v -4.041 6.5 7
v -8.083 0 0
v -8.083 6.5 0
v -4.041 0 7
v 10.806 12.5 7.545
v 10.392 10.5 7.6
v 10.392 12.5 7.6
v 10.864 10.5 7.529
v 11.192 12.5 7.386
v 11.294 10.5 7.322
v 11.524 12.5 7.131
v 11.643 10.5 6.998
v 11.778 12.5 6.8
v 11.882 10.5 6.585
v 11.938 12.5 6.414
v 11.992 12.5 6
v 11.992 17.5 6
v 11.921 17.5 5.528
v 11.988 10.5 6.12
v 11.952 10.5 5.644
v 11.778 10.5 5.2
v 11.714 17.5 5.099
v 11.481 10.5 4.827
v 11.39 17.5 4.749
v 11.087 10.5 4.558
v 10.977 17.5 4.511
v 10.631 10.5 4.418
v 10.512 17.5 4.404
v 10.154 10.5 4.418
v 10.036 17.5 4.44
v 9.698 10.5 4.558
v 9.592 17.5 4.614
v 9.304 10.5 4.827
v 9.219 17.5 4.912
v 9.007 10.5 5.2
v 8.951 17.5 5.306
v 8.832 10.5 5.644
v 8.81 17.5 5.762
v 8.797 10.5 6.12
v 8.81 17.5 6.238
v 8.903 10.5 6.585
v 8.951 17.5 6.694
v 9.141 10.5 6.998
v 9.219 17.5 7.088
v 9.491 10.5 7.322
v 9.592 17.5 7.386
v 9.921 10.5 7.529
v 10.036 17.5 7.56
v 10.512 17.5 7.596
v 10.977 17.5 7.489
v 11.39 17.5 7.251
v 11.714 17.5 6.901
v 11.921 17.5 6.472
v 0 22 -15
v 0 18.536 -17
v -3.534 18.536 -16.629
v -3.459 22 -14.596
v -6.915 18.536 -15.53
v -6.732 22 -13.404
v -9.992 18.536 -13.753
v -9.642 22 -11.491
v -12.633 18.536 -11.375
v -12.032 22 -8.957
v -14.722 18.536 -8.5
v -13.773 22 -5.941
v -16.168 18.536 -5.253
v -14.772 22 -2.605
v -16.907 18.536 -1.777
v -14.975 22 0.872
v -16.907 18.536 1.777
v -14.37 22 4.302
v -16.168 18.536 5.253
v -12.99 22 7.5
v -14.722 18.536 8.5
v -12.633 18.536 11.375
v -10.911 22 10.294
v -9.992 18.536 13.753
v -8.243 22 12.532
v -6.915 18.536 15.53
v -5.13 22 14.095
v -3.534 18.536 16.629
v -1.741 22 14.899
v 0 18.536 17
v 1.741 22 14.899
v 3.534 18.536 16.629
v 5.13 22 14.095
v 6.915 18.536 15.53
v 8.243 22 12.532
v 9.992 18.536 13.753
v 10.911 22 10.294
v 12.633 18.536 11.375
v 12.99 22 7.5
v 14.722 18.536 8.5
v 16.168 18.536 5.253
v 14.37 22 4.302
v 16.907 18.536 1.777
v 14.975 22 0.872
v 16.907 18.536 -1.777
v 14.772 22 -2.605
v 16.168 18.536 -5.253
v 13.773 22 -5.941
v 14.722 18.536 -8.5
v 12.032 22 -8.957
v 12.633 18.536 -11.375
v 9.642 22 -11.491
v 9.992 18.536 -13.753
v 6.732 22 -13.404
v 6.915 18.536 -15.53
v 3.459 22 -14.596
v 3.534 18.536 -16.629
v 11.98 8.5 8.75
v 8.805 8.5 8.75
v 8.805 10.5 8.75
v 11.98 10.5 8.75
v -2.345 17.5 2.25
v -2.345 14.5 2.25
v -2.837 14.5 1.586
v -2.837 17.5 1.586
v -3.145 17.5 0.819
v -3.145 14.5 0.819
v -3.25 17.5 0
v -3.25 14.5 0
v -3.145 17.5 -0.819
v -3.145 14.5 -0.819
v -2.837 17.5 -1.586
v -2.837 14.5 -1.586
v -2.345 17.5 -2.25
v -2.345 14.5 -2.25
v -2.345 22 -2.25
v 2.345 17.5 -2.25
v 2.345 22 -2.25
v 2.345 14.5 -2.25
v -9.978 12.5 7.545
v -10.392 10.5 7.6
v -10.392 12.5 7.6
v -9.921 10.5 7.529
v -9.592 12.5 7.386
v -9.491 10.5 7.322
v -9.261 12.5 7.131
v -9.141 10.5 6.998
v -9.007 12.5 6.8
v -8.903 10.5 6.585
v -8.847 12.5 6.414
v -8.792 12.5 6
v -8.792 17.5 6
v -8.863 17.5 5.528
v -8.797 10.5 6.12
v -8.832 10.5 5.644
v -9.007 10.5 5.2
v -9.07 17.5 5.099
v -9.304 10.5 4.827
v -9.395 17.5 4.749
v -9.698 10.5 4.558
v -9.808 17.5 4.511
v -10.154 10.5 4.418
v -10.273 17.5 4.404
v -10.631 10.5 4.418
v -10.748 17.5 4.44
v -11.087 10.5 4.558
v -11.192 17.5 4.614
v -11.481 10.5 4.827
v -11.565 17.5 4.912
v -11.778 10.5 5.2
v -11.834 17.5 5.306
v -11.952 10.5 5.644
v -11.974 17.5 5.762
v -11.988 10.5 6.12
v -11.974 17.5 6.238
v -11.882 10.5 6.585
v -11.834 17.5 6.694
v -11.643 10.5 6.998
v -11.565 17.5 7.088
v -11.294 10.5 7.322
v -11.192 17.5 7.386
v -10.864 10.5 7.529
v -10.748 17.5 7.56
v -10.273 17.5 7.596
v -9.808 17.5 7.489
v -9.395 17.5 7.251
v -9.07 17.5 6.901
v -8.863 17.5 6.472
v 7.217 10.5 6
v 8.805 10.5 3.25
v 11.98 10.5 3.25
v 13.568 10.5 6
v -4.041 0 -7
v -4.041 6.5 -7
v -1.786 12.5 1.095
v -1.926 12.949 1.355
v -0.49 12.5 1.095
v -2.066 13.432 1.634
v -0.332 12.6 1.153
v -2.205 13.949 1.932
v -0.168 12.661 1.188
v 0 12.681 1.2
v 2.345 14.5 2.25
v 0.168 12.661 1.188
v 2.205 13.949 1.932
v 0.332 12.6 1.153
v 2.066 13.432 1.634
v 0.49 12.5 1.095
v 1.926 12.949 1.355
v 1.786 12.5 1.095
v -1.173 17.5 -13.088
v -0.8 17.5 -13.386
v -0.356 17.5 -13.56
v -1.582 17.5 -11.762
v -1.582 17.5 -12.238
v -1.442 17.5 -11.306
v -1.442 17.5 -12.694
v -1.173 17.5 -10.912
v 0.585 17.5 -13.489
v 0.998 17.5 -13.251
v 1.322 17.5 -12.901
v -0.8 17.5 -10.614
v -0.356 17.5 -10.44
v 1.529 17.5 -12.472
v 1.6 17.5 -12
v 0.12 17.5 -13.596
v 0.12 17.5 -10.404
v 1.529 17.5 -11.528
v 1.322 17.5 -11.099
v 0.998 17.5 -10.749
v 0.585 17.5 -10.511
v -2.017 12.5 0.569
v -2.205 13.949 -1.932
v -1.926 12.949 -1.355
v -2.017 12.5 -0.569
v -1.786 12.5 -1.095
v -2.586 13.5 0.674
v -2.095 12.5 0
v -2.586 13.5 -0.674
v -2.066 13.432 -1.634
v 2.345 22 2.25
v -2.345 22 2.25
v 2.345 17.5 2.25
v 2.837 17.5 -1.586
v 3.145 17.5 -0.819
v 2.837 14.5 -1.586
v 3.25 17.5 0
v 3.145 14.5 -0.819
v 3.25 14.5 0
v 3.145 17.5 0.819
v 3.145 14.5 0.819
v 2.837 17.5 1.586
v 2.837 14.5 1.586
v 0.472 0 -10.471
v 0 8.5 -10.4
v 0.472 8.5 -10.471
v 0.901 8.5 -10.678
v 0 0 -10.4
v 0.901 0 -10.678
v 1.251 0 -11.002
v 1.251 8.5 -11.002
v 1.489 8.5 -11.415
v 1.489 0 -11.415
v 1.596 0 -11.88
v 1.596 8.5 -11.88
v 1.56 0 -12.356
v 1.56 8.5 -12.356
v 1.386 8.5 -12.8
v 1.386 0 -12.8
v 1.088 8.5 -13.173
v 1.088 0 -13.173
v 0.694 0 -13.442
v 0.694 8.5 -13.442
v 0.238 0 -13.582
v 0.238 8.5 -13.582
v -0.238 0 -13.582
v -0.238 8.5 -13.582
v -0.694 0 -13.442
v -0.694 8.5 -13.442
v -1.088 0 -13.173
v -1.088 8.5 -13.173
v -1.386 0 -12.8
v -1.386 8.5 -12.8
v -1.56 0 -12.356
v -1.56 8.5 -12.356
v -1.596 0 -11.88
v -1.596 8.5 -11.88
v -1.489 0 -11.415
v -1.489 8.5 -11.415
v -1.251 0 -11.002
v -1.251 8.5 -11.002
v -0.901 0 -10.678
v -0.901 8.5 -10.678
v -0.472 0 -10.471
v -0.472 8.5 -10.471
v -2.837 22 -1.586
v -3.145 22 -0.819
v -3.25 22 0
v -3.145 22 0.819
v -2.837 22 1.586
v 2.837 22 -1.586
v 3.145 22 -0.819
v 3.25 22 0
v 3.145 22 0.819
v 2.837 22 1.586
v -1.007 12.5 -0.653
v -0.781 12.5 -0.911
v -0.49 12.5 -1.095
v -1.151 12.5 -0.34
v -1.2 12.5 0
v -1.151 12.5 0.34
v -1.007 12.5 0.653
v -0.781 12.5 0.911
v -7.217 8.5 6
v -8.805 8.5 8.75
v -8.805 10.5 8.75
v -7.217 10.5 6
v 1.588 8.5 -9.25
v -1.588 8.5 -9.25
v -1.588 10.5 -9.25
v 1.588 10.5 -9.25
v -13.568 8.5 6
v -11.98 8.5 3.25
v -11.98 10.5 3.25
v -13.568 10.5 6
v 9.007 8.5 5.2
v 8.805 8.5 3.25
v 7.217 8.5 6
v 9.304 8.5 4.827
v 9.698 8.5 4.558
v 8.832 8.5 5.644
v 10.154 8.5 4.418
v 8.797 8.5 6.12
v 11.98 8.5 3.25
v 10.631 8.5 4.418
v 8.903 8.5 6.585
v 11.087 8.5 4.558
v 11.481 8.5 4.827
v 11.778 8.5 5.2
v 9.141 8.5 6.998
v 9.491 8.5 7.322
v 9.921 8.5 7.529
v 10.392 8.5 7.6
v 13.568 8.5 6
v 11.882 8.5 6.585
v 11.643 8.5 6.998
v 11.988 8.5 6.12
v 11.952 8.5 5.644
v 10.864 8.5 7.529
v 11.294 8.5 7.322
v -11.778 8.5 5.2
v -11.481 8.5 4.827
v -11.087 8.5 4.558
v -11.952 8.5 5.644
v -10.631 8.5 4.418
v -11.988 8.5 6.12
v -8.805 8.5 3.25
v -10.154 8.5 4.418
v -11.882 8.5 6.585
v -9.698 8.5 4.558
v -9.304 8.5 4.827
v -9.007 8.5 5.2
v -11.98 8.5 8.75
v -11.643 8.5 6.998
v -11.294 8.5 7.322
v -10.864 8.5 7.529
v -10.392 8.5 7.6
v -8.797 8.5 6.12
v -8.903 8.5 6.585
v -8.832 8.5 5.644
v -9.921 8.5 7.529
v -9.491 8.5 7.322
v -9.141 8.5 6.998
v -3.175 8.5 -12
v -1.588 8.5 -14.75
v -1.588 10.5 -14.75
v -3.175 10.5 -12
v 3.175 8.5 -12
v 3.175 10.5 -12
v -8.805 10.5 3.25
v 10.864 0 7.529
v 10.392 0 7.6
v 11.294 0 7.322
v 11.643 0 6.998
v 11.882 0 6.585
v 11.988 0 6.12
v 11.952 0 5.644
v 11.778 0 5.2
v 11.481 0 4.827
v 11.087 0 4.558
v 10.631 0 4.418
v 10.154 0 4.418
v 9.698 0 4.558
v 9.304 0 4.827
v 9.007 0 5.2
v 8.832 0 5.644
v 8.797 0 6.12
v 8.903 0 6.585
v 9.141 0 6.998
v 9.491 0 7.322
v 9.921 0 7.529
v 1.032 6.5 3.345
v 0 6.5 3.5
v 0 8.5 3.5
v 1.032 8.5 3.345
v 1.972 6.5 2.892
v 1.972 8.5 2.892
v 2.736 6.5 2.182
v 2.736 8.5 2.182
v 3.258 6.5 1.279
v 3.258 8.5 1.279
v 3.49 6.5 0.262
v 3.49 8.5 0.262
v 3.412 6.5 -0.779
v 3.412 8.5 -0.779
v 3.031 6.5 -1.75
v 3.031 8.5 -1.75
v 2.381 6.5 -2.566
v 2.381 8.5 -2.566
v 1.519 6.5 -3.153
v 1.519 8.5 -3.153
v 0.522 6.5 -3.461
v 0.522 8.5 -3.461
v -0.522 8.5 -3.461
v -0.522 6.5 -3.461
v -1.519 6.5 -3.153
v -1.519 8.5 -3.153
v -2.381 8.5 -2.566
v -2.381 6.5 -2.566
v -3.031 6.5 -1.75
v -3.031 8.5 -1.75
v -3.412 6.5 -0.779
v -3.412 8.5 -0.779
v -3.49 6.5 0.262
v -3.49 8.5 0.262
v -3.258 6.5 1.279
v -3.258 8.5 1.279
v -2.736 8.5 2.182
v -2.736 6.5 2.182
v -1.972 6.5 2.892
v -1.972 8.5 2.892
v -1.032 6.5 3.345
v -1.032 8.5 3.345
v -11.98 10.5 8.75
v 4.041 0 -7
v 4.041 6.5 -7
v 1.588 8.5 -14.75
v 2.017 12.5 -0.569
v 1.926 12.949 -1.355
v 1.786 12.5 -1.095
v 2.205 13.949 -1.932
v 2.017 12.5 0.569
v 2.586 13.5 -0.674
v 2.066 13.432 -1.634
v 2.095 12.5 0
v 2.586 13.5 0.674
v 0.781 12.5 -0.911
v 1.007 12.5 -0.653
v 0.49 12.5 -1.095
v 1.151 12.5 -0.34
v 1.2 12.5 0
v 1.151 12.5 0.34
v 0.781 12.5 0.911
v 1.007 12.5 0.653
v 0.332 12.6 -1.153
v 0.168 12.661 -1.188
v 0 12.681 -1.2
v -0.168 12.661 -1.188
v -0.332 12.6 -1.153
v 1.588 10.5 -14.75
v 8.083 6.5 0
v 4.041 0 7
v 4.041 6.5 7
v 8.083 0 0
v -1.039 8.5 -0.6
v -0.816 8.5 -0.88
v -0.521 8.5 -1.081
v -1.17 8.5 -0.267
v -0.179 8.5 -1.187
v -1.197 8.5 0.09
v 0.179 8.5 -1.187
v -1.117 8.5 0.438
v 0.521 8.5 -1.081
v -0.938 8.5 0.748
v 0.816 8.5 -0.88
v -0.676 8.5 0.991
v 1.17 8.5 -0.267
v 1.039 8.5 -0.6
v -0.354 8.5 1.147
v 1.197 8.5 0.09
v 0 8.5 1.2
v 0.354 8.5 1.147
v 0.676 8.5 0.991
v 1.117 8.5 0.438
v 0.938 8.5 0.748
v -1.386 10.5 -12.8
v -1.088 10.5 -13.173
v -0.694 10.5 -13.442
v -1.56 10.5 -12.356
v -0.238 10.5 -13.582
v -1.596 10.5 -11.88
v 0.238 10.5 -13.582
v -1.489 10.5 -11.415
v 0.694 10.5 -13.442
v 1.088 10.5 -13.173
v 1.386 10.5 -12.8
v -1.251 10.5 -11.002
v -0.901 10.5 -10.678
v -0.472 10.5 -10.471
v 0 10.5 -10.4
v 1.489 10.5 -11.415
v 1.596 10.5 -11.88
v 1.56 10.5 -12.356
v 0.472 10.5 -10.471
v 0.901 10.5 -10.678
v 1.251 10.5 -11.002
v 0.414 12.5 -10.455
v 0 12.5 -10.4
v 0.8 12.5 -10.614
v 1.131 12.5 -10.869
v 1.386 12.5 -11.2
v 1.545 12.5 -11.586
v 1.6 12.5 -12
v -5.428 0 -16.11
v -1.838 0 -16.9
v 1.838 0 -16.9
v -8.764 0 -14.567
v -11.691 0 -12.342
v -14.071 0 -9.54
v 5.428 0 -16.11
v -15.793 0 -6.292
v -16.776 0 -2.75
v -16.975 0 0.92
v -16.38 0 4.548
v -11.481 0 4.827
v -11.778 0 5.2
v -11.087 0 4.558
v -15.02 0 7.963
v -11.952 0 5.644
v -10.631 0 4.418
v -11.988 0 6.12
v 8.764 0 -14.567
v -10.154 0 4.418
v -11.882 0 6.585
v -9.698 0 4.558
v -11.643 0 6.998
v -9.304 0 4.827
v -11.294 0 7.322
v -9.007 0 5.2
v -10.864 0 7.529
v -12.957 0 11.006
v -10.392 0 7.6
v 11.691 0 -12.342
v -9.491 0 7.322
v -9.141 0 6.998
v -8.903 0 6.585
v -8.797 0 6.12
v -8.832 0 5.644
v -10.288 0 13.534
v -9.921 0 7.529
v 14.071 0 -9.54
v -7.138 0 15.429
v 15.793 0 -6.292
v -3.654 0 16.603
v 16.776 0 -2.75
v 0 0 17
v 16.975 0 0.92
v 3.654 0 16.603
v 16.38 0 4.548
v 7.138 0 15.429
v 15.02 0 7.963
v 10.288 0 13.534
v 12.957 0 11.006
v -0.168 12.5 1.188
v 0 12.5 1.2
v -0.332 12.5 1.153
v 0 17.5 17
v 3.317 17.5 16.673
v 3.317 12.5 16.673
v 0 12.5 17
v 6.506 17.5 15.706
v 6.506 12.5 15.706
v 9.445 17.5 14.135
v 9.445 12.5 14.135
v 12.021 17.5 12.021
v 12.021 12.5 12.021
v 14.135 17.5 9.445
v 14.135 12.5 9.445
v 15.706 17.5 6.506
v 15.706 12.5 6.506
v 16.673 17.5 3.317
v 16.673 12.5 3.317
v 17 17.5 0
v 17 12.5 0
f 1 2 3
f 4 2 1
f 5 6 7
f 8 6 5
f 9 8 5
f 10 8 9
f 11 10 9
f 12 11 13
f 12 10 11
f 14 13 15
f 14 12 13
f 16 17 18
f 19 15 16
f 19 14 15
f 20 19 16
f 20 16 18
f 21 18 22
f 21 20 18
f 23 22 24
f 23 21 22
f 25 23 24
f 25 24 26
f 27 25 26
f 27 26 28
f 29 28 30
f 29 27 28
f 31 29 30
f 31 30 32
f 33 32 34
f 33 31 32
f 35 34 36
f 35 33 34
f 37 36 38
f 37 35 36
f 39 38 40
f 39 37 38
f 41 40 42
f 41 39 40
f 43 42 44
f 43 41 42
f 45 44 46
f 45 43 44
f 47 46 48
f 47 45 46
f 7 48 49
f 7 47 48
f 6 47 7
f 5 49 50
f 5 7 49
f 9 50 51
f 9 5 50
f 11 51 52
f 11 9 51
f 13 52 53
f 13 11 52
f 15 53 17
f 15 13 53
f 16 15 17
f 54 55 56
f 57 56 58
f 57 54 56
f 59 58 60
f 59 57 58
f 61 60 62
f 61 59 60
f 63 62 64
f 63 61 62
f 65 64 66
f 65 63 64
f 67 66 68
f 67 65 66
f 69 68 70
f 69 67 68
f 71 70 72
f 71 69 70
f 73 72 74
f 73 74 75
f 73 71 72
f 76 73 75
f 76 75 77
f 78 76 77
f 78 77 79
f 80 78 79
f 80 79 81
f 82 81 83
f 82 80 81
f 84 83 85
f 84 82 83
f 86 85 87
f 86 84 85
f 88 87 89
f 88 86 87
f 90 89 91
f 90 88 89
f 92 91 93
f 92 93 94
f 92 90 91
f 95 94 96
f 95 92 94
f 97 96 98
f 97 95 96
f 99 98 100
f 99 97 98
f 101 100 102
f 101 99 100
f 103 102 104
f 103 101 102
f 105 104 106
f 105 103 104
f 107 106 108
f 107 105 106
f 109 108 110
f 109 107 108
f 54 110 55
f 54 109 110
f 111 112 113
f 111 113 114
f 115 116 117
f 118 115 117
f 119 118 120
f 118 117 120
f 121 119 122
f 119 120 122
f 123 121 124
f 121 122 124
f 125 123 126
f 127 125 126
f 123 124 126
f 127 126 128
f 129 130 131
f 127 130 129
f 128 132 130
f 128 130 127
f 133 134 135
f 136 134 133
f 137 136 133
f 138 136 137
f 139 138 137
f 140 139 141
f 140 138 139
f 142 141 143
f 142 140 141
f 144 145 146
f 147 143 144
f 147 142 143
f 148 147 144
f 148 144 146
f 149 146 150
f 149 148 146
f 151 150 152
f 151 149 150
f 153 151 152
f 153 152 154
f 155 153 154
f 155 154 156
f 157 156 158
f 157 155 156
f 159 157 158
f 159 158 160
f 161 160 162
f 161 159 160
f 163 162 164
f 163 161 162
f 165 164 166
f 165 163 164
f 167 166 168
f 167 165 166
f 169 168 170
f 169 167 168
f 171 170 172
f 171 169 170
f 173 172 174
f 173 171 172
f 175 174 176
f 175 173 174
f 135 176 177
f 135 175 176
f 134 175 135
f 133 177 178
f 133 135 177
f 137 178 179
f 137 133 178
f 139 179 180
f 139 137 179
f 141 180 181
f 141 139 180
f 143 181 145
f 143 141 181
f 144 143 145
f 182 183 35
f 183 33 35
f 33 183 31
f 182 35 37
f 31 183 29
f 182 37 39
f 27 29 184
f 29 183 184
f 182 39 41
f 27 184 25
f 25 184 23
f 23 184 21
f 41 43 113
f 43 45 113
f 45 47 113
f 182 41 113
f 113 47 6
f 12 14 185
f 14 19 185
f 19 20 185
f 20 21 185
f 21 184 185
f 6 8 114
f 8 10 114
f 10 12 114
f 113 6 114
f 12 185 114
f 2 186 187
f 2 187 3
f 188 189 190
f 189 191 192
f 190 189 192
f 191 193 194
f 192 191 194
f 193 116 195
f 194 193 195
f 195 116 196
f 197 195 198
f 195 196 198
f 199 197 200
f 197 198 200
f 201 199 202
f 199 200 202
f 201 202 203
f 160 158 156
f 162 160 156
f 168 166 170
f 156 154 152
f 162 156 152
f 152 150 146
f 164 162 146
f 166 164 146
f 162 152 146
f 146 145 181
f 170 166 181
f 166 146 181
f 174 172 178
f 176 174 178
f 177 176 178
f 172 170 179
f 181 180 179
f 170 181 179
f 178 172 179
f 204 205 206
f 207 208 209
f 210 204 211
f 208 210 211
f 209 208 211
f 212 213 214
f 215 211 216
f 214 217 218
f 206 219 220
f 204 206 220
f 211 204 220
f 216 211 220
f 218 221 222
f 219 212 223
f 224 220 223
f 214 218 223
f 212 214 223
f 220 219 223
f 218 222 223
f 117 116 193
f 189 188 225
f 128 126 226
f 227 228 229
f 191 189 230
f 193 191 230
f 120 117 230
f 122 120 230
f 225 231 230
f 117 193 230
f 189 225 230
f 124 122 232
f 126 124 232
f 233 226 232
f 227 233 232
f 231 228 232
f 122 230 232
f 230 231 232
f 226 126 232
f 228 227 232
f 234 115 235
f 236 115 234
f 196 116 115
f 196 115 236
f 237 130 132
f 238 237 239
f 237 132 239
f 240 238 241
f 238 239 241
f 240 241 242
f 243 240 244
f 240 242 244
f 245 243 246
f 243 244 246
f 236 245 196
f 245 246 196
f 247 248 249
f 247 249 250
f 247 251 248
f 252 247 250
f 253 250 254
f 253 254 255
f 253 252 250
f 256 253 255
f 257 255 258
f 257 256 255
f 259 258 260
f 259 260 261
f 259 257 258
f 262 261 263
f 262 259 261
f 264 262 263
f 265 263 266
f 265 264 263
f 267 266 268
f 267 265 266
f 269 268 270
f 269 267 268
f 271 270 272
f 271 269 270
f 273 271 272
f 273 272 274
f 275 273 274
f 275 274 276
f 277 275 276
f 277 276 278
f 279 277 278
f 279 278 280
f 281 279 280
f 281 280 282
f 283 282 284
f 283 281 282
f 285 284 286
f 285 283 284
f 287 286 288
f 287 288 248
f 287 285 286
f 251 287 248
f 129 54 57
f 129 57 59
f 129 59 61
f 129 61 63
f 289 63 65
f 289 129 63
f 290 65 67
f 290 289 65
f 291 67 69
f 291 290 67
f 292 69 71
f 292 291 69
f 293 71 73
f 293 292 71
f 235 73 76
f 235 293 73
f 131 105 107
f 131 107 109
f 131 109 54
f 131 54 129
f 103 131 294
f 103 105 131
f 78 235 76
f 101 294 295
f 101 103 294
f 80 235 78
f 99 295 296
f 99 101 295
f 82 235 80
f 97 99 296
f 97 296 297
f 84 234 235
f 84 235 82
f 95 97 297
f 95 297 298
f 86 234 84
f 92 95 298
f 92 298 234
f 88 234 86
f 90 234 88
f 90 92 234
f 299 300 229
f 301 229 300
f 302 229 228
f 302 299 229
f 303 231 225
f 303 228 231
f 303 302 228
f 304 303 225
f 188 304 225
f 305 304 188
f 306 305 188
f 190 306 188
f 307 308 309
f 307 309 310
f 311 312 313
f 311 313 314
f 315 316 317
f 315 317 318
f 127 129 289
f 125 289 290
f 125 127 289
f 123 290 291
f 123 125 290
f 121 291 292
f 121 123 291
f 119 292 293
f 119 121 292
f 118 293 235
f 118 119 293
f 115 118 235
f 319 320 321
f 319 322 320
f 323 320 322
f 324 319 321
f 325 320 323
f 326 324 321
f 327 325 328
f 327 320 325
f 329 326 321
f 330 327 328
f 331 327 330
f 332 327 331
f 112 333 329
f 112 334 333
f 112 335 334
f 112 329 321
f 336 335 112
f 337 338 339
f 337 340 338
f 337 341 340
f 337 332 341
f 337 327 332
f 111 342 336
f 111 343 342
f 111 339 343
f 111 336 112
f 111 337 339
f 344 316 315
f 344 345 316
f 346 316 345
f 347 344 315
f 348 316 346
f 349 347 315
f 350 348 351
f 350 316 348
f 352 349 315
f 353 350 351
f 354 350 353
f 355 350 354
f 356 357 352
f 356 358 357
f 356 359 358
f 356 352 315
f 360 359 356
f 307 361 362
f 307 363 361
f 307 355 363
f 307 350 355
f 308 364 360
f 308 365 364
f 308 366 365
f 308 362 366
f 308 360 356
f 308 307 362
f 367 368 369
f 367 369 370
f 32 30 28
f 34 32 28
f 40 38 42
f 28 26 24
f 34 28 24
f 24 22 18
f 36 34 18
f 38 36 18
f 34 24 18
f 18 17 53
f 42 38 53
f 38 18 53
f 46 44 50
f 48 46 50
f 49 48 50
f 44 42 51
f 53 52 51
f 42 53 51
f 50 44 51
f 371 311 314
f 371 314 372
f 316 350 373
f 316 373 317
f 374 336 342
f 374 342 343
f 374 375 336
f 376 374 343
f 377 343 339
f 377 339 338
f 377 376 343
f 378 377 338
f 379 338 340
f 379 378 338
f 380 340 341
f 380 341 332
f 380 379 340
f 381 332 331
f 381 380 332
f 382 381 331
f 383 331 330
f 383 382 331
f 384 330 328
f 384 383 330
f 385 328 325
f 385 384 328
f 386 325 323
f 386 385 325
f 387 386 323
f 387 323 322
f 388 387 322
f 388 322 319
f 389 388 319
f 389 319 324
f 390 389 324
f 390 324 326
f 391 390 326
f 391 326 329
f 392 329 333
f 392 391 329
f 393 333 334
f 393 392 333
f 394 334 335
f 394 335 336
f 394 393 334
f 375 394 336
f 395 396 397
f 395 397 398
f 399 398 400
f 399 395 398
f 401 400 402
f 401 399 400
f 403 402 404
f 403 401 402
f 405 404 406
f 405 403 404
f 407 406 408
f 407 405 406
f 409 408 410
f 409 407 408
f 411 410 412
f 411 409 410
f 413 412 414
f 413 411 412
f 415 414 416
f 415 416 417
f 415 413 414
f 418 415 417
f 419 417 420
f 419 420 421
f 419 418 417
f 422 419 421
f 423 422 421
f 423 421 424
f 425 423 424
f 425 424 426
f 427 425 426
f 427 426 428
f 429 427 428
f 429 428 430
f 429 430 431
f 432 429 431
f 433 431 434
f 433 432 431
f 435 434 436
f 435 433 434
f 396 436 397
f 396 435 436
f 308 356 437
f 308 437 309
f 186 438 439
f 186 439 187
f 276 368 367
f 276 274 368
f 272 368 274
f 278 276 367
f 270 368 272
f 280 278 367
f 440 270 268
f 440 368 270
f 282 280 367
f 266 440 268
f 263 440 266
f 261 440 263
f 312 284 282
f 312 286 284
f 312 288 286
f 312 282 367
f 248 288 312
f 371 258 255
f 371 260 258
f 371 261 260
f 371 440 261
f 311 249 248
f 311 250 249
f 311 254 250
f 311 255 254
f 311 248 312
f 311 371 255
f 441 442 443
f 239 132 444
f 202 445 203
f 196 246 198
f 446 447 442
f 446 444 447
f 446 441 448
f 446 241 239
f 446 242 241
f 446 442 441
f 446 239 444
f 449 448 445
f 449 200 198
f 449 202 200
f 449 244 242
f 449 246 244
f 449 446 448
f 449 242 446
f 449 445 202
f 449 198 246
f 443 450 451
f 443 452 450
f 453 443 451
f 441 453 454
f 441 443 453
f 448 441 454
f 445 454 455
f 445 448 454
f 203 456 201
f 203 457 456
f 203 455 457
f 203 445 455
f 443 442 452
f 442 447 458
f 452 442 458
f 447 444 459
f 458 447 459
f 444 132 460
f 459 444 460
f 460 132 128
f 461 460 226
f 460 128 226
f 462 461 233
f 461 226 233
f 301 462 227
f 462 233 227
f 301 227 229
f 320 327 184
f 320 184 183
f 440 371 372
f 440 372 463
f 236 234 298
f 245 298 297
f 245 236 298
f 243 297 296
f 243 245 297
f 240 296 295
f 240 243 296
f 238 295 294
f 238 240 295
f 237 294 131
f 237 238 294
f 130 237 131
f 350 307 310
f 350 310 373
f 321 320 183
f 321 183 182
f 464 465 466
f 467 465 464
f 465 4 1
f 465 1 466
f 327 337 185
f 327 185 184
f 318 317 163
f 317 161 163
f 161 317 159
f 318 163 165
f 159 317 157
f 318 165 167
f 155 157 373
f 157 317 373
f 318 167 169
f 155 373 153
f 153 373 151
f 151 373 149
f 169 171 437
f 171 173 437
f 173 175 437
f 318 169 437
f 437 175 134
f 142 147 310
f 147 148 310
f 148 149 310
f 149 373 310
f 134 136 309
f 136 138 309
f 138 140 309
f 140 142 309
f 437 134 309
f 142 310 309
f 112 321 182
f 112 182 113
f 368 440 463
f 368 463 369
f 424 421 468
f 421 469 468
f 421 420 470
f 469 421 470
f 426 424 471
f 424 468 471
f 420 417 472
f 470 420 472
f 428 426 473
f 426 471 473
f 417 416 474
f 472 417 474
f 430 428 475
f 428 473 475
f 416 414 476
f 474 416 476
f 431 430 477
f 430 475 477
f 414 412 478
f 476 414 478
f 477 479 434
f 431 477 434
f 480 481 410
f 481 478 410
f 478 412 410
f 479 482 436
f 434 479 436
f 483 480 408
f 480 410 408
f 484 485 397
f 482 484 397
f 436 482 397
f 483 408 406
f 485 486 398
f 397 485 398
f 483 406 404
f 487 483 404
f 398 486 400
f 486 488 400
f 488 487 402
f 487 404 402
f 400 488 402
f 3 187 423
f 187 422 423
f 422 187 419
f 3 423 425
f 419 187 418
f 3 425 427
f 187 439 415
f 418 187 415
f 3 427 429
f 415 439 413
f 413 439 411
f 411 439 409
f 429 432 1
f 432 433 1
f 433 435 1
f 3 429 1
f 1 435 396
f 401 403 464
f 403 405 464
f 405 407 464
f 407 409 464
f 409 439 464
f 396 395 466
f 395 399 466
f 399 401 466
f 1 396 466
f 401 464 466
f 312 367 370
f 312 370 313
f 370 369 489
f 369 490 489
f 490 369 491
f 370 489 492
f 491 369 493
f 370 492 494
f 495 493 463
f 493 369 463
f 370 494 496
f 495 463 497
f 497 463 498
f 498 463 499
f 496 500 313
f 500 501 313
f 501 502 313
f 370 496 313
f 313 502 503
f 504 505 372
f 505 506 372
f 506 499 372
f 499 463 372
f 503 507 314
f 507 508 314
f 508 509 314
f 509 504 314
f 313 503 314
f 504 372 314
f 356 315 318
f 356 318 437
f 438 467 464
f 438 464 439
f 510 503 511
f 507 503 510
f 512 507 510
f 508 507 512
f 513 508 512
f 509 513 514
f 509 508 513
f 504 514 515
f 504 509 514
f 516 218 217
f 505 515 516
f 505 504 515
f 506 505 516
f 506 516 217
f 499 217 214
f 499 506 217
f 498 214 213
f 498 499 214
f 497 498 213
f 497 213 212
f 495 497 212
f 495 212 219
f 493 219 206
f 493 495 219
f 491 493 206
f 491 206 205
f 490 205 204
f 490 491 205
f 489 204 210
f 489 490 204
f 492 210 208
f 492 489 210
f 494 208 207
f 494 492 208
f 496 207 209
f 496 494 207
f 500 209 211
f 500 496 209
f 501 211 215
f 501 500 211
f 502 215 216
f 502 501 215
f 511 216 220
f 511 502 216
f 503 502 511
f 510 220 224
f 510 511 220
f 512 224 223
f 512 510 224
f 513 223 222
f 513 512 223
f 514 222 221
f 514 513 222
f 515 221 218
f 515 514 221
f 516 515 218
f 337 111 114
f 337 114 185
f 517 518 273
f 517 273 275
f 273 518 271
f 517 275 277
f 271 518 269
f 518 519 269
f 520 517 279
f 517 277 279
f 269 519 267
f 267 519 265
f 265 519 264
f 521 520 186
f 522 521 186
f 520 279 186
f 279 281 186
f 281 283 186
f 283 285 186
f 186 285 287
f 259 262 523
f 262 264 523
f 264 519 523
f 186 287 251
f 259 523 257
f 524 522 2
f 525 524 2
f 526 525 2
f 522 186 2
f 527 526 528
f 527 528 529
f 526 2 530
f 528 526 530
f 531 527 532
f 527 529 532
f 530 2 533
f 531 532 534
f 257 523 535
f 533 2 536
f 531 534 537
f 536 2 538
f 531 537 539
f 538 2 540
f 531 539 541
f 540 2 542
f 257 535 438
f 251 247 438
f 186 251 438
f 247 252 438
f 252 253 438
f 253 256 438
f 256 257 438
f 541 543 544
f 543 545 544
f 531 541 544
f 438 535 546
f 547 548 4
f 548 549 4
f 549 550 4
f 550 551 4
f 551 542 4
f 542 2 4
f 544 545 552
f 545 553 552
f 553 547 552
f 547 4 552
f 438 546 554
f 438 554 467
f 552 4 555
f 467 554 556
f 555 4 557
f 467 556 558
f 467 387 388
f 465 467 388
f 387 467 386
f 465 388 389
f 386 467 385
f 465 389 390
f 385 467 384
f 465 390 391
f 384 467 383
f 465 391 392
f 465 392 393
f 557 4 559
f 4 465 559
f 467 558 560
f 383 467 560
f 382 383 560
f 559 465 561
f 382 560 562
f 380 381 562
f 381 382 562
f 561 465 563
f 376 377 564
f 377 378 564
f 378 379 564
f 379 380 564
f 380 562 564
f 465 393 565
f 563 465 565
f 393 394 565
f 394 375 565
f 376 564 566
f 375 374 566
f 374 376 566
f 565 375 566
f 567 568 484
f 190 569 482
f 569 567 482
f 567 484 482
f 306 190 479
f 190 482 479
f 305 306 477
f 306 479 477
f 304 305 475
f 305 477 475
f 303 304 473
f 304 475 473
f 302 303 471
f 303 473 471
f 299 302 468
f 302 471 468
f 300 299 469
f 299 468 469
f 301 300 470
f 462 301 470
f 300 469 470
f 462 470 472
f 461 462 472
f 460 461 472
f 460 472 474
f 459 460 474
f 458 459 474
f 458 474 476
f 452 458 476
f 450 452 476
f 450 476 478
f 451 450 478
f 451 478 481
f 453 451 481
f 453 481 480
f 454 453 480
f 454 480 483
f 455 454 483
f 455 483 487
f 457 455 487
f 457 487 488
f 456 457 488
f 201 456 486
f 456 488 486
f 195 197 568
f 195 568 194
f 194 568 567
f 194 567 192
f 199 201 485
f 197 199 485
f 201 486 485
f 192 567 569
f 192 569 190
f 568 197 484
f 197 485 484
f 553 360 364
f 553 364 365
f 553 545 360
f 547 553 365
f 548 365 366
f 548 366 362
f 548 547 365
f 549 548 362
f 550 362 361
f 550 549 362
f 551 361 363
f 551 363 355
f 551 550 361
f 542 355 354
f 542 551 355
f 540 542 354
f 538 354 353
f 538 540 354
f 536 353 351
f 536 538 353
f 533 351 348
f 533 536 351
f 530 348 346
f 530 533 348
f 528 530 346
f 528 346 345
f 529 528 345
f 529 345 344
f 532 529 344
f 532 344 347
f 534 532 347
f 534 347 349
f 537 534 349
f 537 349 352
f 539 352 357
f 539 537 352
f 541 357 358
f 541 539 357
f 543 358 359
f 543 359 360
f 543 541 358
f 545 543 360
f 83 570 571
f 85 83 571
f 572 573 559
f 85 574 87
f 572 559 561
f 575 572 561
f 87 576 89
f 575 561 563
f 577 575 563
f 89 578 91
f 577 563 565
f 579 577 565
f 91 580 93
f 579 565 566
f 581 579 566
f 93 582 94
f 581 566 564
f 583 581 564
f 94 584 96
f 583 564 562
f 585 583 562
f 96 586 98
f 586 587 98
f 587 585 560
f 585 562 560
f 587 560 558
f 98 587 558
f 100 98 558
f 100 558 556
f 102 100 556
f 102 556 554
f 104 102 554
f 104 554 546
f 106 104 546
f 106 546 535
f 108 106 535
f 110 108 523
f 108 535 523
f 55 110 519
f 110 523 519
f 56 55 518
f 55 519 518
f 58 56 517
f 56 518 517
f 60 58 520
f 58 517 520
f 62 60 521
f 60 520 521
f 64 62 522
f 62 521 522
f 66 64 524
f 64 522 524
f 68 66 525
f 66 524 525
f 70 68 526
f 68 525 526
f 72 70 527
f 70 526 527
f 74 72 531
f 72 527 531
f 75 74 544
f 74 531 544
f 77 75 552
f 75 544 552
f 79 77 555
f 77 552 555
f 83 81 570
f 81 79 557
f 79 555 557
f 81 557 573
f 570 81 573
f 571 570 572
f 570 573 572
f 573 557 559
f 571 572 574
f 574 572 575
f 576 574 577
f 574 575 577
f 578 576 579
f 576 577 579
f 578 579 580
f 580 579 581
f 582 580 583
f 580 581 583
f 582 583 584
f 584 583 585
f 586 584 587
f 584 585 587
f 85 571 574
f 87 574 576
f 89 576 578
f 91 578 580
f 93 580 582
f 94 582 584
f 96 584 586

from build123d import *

# Parameters (mm, degrees)
SKETCH1_R                 = 17
SKETCH1_R_2               = 1.6000000000000005
SKETCH1_R_3               = 1.6000000000000019
SKETCH1_R_4               = 1.5999999999999999
BOSS_EXTRUDE1_DEPTH       = 6.500000000000001
SKETCH2_R                 = 17
SKETCH2_R_2               = 3.4999999999999996
SKETCH2_R_3               = 1.6000000000000012
SKETCH2_R_4               = 1.6000000000000019
SKETCH2_R_5               = 1.5999999999999963
BOSS_EXTRUDE2_DEPTH       = 2
SKETCH3_R                 = 17
SKETCH3_R_2               = 1.2
BOSS_EXTRUDE3_DEPTH       = 2
SKETCH9_R                 = 17
SKETCH9_R_2               = 1.2
SKETCH9_R_3               = 1.5999999999999963
SKETCH9_R_4               = 1.6000000000000012
SKETCH9_R_5               = 1.6000000000000019
BOSS_EXTRUDE6_DEPTH       = 2
BOSS_EXTRUDE4_OUTLINE_R   = 17
BOSS_EXTRUDE4_OUTLINE_R_2 = 1.6
BOSS_EXTRUDE4_DEPTH       = 5
SKETCH10_R                = 17
BOSS_EXTRUDE7_DEPTH       = 4.500000000000001
CHAMFER1_SIZE             = 1.154700538
CHAMFER1_SIZE_2           = 2


# Read off the part's stored shape, not the designer's step: Boss-Extrude4
with BuildPart() as part:
    # Sketch1 → Boss-Extrude1 (new body)
    with BuildSketch(Plane(origin=(0, 0, 0), x_dir=(1, 0, 0), z_dir=(0, 1, 0))):
        with Locations(Location((0, 0, 0), (0, 0, 270))):
            Circle(SKETCH1_R)
        with Locations(Location((0, 12, 0), (0, 0, 270))):
            Circle(SKETCH1_R_2, mode=Mode.SUBTRACT)
        with Locations(Location((10.392304845413268, -5.999999999999997, 0), (0, 0, 270))):
            Circle(SKETCH1_R_3, mode=Mode.SUBTRACT)
        with Locations(Location((-10.39230484541326, -6.000000000000005, 0), (0, 0, 270))):
            Circle(SKETCH1_R_4, mode=Mode.SUBTRACT)
        Polygon((4.04145188432738, -6.999999999999999), (8.082903768654761, -8.7e-16), (4.041451884327381, 6.999999999999999), (-4.041451884327381, 6.999999999999999), (-8.082903768654761, -8.7e-16), (-4.04145188432738, -6.999999999999999), align=None, mode=Mode.SUBTRACT)
    extrude(amount=BOSS_EXTRUDE1_DEPTH)

    # Sketch2 → Boss-Extrude2 (add)
    with BuildSketch(Plane(origin=(0, 6.500000000000001, 0), x_dir=(1, 0, 0), z_dir=(0, 1, 0))):
        with Locations(Location((0, 0, 0), (0, 0, 270))):
            Circle(SKETCH2_R)
        with Locations(Location((0, 0, 0), (0, 0, 270))):
            Circle(SKETCH2_R_2, mode=Mode.SUBTRACT)
        with Locations(Location((0, 12, 0), (0, 0, 270))):
            Circle(SKETCH2_R_3, mode=Mode.SUBTRACT)
        with Locations(Location((10.392304845413268, -5.999999999999997, 0), (0, 0, 270))):
            Circle(SKETCH2_R_4, mode=Mode.SUBTRACT)
        with Locations(Location((-10.39230484541326, -6.000000000000005, 0), (0, 0, 270))):
            Circle(SKETCH2_R_5, mode=Mode.SUBTRACT)
    extrude(amount=BOSS_EXTRUDE2_DEPTH)

    # Sketch3 → Boss-Extrude3 (add)
    with BuildSketch(Plane(origin=(0, 8.5, 0), x_dir=(1, 0, 0), z_dir=(0, 1, 0))):
        with Locations(Location((0, 0, 0), (0, 0, 270))):
            Circle(SKETCH3_R)
        with Locations(Location((0, 0, 0), (0, 0, 270))):
            Circle(SKETCH3_R_2, mode=Mode.SUBTRACT)
        Polygon((3.175426480542944, 11.999999999999996), (1.5877132402714735, 14.75), (-1.5877132402714682, 14.75), (-3.1754264805429417, 11.999999999999995), (-1.5877132402714735, 9.249999999999998), (1.5877132402714729, 9.249999999999998), align=None, mode=Mode.SUBTRACT)
        Polygon((-8.804591605141788, -8.750000000000009), (-7.216878364870316, -6.0000000000000036), (-8.80459160514179, -3.2500000000000013), (-11.980018085684733, -3.250000000000002), (-13.567731325956206, -6.000000000000007), (-11.980018085684732, -8.750000000000009), align=None, mode=Mode.SUBTRACT)
        Polygon((8.804591605141793, -8.75), (11.980018085684742, -8.75), (13.567731325956213, -5.999999999999997), (11.98001808568474, -3.2499999999999925), (8.804591605141791, -3.249999999999992), (7.216878364870319, -5.999999999999996), align=None, mode=Mode.SUBTRACT)
    extrude(amount=BOSS_EXTRUDE3_DEPTH)

    # Sketch9 → Boss-Extrude6 (add)
    with BuildSketch(Plane(origin=(0, 10.5, 0), x_dir=(1, 0, 0), z_dir=(0, 1, 0))):
        with Locations(Location((0, 0, 0), (0, 0, 270))):
            Circle(SKETCH9_R)
        with Locations(Location((0, 0, 0), (0, 0, 270))):
            Circle(SKETCH9_R_2, mode=Mode.SUBTRACT)
        with Locations(Location((-10.39230484541326, -6.000000000000005, 0), (0, 0, 270))):
            Circle(SKETCH9_R_3, mode=Mode.SUBTRACT)
        with Locations(Location((0, 12, 0), (0, 0, 270))):
            Circle(SKETCH9_R_4, mode=Mode.SUBTRACT)
        with Locations(Location((10.392304845413268, -5.999999999999997, 0), (0, 0, 270))):
            Circle(SKETCH9_R_5, mode=Mode.SUBTRACT)
    extrude(amount=BOSS_EXTRUDE6_DEPTH)

    # Boss-Extrude4 outline → Boss-Extrude4 (add)
    with BuildSketch(Plane(origin=(0, 12.5, 0), x_dir=(1, 0, 0), z_dir=(0, 1, 0))):
        Circle(BOSS_EXTRUDE4_OUTLINE_R)
        with Locations((-10.392304845, -6)):
            Circle(BOSS_EXTRUDE4_OUTLINE_R_2, mode=Mode.SUBTRACT)
        with Locations((10.392304845, -6)):
            Circle(BOSS_EXTRUDE4_OUTLINE_R_2, mode=Mode.SUBTRACT)
        with BuildLine():
            Line((-2.34520788, 2.25), (2.34520788, 2.25))
            ThreePointArc((2.34520788, 2.25), (3.25, 0), (2.34520788, -2.25))
            Line((2.34520788, -2.25), (-2.34520788, -2.25))
            ThreePointArc((-2.34520788, -2.25), (-3.25, 0), (-2.34520788, 2.25))
        make_face(mode=Mode.SUBTRACT)
        with Locations((0, 12)):
            Circle(BOSS_EXTRUDE4_OUTLINE_R_2, mode=Mode.SUBTRACT)
    extrude(amount=BOSS_EXTRUDE4_DEPTH)

    # Sketch10 → Boss-Extrude7 (add)
    with BuildSketch(Plane(origin=(0, 17.5, 0), x_dir=(1, 0, 0), z_dir=(0, 1, 0))):
        with Locations(Location((0, 0, 0), (0, 0, 270))):
            Circle(SKETCH10_R)
        with BuildLine():
            Line((-2.345207879911715, -2.2500000000000004), (2.345207879911715, -2.2500000000000004))
            ThreePointArc((2.345207879911715, -2.2500000000000004), (3.2500000000000004, 0), (2.345207879911715, 2.2500000000000004))
            Line((2.345207879911715, 2.2500000000000004), (-2.345207879911715, 2.2500000000000004))
            ThreePointArc((-2.345207879911715, 2.2500000000000004), (-3.2500000000000004, 4e-16), (-2.345207879911715, -2.2500000000000004))
        make_face(mode=Mode.SUBTRACT)
    extrude(amount=BOSS_EXTRUDE7_DEPTH)

    # Sketch5 → Cut-Revolve2 (revolve, cut)
    with BuildSketch(Plane(origin=(0, 0, 0), x_dir=(0, 0, -1), z_dir=(1, 0, 0)), mode=Mode.PRIVATE) as cut_revolve2_sk:
        Polygon((-17, 18.535898384862204), (-15.000000000000002, 22), (-17, 22.000000000000004), align=None)
    revolve(cut_revolve2_sk.sketch.rotate(Axis((0, 0, 0), (0, 1, 0)), 180), axis=Axis((0, 0, 0), (0, 1, 0)), mode=Mode.SUBTRACT)

    # Chamfer1
    # the kernel refuses this chamfer: 2, 1.154700538 mm, written as the material it adds along each edge
    with BuildSketch(Plane(origin=(-2.2883428e-10, 12.5, 0), x_dir=(-0.7079171545098687, 0, -0.706295478076032), z_dir=(-0.706295478076032, 0, 0.7079171545098687))) as chamfer1_piece_1:
        Polygon((3.2500000002288263 - CHAMFER1_SIZE, 0), (3.2500000002288343, -CHAMFER1_SIZE_2), (3.2500000002288263, 0), align=None)
    revolve(axis=Axis((-2.2883428e-10, 12.5, 0), (0, -1, 0)), revolution_arc=270.1314019865591)
    with BuildSketch(Plane(origin=(-7.519379389291984, 12.5, -2.2500000000000004), x_dir=(0, 0.9998132206222079, -0.01932676561270072), z_dir=(1, 0, 0))) as chamfer1_piece_2_section:
        Polygon((CHAMFER1_SIZE_2 * 0.999813220622, CHAMFER1_SIZE_2 * 0.0193267656127), (-CHAMFER1_SIZE * 0.019326765619, CHAMFER1_SIZE * 0.999813220951), (0, 0), align=None)
    chamfer1_piece_2 = extrude(amount=15.038758778583968, mode=Mode.PRIVATE)
    chamfer1_piece_2 = chamfer1_piece_2 - Plane(origin=(0, 13.182227685151497, 0), x_dir=(-1.8e-16, 0, 1), z_dir=(0, -1, 0)) * Cylinder(1.2, 39, mode=Mode.PRIVATE)
    add(chamfer1_piece_2)
    with BuildSketch(Plane(origin=(2.2883428e-10, 12.5, 0), x_dir=(0.7079171545098687, 0, 0.706295478076032), z_dir=(0.706295478076032, 0, -0.7079171545098687))) as chamfer1_piece_3:
        Polygon((3.2500000002288343, -CHAMFER1_SIZE_2), (3.250000000228834 - CHAMFER1_SIZE, 0), (3.250000000228834, 0), align=None)
    revolve(axis=Axis((2.2883428e-10, 12.5, 0), (0, -1, 0)), revolution_arc=270.1314019865591)
    with BuildSketch(Plane(origin=(7.519379389291984, 12.5, 2.2500000000000004), x_dir=(0, 0.9998132206222079, 0.01932676561270072), z_dir=(-1, 0, 0))) as chamfer1_piece_4_section:
        Polygon((CHAMFER1_SIZE_2 * 0.999813220622, CHAMFER1_SIZE_2 * 0.0193267656127), (-CHAMFER1_SIZE * 0.019326765619, CHAMFER1_SIZE * 0.999813220951), (0, 0), align=None)
    chamfer1_piece_4 = extrude(amount=15.038758778583968, mode=Mode.PRIVATE)
    chamfer1_piece_4 = chamfer1_piece_4 - Plane(origin=(0, 13.182227685146668, 0), x_dir=(-1.8e-16, 0, 1), z_dir=(0, -1, 0)) * Cylinder(1.2, 39, mode=Mode.PRIVATE)
    add(chamfer1_piece_4)


solid = part.part
